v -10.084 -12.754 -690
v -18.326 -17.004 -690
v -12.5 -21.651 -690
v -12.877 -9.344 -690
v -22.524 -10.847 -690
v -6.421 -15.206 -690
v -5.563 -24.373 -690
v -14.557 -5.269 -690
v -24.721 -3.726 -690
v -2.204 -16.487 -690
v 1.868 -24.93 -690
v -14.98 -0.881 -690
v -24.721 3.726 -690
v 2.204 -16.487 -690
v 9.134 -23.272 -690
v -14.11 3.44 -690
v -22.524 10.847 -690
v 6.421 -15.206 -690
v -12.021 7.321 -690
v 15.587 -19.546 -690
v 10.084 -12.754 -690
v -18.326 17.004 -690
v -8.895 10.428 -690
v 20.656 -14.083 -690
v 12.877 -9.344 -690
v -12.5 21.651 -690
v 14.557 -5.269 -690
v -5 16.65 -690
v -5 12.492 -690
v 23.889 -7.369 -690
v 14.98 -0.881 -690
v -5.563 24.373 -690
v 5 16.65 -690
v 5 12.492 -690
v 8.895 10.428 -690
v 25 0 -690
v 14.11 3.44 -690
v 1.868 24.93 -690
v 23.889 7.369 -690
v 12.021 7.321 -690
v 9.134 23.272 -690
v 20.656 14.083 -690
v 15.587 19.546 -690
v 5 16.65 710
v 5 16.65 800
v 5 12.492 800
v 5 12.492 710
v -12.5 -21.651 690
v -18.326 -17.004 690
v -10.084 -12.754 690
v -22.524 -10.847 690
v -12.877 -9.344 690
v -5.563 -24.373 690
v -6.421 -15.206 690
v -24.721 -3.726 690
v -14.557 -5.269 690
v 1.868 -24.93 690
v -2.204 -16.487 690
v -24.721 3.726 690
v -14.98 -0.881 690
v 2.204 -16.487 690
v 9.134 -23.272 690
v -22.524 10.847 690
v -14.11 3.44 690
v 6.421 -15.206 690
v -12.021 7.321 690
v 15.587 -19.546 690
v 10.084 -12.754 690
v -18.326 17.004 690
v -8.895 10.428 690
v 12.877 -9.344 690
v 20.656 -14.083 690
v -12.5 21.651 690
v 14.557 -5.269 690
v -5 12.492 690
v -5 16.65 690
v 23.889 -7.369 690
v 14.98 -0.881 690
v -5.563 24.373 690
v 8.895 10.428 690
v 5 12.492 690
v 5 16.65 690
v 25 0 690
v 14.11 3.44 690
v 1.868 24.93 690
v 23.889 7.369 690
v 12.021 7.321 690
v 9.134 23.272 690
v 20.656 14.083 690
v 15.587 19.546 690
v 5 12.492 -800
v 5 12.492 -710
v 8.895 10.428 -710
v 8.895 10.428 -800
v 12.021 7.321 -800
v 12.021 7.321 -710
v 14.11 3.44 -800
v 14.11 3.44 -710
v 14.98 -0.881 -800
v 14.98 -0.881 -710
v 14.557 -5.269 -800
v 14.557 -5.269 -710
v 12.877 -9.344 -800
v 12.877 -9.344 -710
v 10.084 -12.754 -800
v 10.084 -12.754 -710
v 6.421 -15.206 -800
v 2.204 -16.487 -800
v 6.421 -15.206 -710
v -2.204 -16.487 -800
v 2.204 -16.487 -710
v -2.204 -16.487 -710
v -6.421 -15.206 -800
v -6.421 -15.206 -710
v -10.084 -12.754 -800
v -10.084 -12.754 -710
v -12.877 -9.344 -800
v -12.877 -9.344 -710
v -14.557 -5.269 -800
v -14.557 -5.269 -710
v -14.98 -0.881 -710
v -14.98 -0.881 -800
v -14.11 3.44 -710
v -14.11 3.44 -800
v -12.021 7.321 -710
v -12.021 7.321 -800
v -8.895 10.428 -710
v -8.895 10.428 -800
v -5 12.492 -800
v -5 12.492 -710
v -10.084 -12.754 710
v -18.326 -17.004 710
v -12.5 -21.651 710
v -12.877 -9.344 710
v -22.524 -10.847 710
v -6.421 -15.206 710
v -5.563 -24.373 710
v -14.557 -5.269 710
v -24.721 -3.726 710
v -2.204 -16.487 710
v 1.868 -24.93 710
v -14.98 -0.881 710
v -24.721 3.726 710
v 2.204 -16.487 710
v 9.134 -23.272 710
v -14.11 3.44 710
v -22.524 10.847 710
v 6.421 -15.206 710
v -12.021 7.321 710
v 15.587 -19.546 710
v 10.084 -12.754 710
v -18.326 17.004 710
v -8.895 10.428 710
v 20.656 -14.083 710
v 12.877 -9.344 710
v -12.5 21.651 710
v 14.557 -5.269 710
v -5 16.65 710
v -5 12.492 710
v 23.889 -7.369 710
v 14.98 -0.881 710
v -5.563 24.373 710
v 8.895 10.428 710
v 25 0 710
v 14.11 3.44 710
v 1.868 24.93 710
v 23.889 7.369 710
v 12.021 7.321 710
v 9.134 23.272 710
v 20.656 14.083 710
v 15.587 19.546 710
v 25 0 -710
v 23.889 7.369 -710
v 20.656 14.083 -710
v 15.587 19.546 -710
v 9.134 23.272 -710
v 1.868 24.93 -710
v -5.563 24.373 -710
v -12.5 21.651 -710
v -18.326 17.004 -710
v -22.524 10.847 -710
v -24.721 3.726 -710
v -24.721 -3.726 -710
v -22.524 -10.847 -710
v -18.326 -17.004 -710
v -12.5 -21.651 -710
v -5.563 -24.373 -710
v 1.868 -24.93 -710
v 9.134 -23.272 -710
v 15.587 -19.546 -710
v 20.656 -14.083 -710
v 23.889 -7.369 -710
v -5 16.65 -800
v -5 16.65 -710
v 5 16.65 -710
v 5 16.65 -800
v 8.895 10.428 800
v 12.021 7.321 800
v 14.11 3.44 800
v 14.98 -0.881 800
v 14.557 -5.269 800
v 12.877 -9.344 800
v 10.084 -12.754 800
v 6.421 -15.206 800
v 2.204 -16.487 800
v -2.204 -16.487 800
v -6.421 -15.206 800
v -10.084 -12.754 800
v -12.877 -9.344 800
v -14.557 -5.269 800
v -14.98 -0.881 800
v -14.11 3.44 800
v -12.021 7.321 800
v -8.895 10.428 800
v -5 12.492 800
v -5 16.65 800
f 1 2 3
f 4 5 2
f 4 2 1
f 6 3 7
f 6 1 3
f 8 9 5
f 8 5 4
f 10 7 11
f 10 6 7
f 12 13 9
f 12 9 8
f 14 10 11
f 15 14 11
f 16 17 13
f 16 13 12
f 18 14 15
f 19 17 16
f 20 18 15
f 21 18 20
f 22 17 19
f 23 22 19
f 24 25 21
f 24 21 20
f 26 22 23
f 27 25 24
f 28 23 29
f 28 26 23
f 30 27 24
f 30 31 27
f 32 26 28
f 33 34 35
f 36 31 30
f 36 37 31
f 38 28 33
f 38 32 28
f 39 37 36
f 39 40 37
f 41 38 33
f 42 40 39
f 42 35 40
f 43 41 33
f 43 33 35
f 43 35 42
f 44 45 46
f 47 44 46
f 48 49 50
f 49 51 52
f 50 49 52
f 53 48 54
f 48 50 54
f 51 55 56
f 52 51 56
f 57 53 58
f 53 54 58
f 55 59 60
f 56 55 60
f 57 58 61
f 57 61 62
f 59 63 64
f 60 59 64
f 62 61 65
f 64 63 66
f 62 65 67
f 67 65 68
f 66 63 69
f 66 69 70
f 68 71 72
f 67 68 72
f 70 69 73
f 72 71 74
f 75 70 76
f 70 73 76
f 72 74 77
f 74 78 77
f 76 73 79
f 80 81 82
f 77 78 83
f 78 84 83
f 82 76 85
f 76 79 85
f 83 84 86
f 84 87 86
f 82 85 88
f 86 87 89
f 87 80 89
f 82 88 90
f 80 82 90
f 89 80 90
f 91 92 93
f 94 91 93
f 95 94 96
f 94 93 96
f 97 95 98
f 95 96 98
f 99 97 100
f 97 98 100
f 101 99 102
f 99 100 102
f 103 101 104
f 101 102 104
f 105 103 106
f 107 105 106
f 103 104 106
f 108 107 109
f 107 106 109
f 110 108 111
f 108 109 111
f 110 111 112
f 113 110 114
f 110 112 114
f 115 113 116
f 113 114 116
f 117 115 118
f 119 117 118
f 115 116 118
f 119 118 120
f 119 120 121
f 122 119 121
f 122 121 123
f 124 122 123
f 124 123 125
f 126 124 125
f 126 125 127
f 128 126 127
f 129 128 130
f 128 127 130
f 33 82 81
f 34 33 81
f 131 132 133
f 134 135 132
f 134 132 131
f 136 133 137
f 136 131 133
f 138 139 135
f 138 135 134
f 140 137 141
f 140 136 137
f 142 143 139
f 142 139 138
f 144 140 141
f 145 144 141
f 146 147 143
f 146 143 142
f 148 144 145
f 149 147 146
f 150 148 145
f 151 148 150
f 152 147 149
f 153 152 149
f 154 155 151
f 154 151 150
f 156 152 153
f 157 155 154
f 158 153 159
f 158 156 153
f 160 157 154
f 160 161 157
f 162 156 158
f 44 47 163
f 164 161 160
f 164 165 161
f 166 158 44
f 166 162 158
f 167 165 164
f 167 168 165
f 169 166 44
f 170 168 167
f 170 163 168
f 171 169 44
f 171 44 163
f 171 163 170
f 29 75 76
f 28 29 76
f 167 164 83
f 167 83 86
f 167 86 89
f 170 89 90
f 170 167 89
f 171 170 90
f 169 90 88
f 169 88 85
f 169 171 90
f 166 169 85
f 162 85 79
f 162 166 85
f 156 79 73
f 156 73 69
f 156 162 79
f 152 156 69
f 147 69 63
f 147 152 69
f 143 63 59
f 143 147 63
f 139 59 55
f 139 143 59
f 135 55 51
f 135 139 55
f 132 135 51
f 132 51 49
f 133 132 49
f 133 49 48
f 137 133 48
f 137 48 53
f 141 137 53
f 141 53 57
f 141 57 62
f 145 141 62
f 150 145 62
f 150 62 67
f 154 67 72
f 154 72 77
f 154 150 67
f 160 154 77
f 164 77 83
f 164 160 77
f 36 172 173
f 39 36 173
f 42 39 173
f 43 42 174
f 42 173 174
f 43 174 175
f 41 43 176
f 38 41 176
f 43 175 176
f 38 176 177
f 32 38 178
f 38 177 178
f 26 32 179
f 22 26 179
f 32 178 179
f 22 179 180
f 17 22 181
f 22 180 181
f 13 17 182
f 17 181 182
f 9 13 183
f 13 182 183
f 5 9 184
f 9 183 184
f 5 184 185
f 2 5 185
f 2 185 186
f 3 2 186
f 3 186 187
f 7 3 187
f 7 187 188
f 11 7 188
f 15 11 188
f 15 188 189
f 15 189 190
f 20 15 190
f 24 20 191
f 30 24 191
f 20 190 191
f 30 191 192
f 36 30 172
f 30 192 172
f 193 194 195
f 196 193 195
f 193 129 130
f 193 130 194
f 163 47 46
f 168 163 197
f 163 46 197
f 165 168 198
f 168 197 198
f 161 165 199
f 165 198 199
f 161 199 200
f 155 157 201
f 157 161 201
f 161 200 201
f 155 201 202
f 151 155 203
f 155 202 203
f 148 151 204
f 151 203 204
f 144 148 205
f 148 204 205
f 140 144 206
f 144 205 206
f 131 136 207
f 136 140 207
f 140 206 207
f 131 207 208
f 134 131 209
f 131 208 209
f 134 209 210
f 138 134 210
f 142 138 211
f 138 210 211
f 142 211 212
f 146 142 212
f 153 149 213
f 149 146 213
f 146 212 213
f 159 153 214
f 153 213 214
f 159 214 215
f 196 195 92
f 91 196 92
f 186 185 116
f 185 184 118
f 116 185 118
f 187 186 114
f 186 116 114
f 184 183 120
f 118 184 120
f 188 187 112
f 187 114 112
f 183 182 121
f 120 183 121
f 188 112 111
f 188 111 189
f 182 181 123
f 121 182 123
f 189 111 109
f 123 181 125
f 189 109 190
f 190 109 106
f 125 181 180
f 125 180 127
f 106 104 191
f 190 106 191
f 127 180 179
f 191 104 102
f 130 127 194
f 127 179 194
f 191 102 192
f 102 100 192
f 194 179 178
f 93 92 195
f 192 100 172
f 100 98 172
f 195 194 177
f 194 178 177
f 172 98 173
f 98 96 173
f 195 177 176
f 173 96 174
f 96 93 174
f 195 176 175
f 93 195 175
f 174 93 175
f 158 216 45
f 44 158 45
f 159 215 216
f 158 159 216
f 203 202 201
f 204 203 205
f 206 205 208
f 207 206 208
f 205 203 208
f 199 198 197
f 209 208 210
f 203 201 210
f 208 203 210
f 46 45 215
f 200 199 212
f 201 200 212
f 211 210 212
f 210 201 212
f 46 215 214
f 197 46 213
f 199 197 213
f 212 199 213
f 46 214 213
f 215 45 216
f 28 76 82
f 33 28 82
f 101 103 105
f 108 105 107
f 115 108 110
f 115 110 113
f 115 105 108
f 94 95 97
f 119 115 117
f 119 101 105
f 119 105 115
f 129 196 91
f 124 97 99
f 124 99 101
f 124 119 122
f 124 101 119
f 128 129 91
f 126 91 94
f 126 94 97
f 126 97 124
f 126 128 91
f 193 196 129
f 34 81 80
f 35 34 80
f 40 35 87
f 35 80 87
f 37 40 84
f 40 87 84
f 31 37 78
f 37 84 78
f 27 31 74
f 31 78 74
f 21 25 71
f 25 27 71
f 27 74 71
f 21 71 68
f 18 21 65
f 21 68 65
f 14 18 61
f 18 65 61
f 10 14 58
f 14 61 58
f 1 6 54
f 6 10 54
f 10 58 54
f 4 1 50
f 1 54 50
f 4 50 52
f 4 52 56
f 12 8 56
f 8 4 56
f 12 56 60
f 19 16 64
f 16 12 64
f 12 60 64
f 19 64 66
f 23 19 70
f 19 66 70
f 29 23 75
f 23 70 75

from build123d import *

# Parameters (mm, degrees)
BOSS_EXTRUDE1_DEPTH = 800
SKETCH2_R           = 25
BOSS_EXTRUDE2_DEPTH = 20


with BuildPart() as part:
    # Sketch1 → Boss-Extrude1 (new, symmetric)
    with BuildSketch(Plane.XY):
        with BuildLine():
            Line((-5, 12.492135624), (-5, 16.65))
            Line((-5, 16.65), (5, 16.65))
            Line((5, 16.65), (5, 12.492135624))
            ThreePointArc((5, 12.492135624), (0, -16.65), (-5, 12.492135624))
        make_face()
    extrude(amount=BOSS_EXTRUDE1_DEPTH, both=True)

    # Sketch2 → Boss-Extrude2 (add)
    with BuildSketch(Plane.XY.offset(710)):
        Circle(SKETCH2_R)
    boss_extrude2 = extrude(amount=-BOSS_EXTRUDE2_DEPTH)

    # Mirror1: Boss-Extrude2 across plane
    add(boss_extrude2.mirror(Plane.XY))


solid = part.part
